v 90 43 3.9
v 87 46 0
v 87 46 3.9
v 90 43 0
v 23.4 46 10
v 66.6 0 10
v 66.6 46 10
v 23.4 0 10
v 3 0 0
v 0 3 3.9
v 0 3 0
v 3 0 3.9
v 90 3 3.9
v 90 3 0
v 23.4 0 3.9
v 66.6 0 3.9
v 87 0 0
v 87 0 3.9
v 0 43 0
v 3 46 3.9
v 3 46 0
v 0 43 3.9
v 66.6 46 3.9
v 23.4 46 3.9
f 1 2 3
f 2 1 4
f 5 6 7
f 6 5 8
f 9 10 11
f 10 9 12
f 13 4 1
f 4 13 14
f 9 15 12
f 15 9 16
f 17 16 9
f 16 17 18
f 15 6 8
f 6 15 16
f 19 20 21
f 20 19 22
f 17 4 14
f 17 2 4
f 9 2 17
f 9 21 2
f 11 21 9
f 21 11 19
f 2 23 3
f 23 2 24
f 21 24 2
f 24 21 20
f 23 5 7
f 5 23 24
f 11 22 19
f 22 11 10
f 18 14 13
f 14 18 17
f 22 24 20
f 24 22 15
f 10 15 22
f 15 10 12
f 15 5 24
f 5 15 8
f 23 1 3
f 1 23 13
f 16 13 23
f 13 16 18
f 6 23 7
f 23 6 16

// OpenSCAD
$fn = 32;

// ----------------------------------------------------------------------
// Stepped bar: centerstep, 90 x 46 x 10/3.9 mm
// ----------------------------------------------------------------------

// --- parameters (mm) ---
bar_l = 90;               // bar length, X
bar_w = 46;               // bar width, Y
plate_t = 10;             // thickness of the thick zone, Z
thin_t = 3.9;             // thickness of the thin zone
corner_c = 3;             // corner chamfer of the bar
step_cut = 6.1;           // material removed from the thin zone
thick_from = 23.4;        // start of the thick middle zone
thick_to = 66.6;          // end of the thick middle zone
depth_1 = 6.1;            // depth of cut 1 from the top face
depth_2 = 6.1;            // depth of cut 2 from the top face
fit_tol = 0.1;            // declared fit tolerance (prompt contract)
free_tol = 0.3;           // declared free tolerance (prompt contract)

profile = [[3, 0], [87, 0], [90, 3], [90, 43], [87, 46], [3, 46], [0, 43], [0, 3]];  // primary outline, 8 points, counter clockwise
void_1 = [[-1, -1], [23.4, -1], [23.4, 47], [-1, 47]];  // thin left end, 4 points
void_2 = [[66.6, -1], [91, -1], [91, 47], [66.6, 47]];  // thin right end, 4 points

// --- the one profile operation ---
difference() {
  linear_extrude(height = plate_t) polygon(points = profile);
  translate([0, 0, plate_t - depth_1])
    linear_extrude(height = depth_1 + 1) polygon(points = void_1);
  translate([0, 0, plate_t - depth_2])
    linear_extrude(height = depth_2 + 1) polygon(points = void_2);
}
